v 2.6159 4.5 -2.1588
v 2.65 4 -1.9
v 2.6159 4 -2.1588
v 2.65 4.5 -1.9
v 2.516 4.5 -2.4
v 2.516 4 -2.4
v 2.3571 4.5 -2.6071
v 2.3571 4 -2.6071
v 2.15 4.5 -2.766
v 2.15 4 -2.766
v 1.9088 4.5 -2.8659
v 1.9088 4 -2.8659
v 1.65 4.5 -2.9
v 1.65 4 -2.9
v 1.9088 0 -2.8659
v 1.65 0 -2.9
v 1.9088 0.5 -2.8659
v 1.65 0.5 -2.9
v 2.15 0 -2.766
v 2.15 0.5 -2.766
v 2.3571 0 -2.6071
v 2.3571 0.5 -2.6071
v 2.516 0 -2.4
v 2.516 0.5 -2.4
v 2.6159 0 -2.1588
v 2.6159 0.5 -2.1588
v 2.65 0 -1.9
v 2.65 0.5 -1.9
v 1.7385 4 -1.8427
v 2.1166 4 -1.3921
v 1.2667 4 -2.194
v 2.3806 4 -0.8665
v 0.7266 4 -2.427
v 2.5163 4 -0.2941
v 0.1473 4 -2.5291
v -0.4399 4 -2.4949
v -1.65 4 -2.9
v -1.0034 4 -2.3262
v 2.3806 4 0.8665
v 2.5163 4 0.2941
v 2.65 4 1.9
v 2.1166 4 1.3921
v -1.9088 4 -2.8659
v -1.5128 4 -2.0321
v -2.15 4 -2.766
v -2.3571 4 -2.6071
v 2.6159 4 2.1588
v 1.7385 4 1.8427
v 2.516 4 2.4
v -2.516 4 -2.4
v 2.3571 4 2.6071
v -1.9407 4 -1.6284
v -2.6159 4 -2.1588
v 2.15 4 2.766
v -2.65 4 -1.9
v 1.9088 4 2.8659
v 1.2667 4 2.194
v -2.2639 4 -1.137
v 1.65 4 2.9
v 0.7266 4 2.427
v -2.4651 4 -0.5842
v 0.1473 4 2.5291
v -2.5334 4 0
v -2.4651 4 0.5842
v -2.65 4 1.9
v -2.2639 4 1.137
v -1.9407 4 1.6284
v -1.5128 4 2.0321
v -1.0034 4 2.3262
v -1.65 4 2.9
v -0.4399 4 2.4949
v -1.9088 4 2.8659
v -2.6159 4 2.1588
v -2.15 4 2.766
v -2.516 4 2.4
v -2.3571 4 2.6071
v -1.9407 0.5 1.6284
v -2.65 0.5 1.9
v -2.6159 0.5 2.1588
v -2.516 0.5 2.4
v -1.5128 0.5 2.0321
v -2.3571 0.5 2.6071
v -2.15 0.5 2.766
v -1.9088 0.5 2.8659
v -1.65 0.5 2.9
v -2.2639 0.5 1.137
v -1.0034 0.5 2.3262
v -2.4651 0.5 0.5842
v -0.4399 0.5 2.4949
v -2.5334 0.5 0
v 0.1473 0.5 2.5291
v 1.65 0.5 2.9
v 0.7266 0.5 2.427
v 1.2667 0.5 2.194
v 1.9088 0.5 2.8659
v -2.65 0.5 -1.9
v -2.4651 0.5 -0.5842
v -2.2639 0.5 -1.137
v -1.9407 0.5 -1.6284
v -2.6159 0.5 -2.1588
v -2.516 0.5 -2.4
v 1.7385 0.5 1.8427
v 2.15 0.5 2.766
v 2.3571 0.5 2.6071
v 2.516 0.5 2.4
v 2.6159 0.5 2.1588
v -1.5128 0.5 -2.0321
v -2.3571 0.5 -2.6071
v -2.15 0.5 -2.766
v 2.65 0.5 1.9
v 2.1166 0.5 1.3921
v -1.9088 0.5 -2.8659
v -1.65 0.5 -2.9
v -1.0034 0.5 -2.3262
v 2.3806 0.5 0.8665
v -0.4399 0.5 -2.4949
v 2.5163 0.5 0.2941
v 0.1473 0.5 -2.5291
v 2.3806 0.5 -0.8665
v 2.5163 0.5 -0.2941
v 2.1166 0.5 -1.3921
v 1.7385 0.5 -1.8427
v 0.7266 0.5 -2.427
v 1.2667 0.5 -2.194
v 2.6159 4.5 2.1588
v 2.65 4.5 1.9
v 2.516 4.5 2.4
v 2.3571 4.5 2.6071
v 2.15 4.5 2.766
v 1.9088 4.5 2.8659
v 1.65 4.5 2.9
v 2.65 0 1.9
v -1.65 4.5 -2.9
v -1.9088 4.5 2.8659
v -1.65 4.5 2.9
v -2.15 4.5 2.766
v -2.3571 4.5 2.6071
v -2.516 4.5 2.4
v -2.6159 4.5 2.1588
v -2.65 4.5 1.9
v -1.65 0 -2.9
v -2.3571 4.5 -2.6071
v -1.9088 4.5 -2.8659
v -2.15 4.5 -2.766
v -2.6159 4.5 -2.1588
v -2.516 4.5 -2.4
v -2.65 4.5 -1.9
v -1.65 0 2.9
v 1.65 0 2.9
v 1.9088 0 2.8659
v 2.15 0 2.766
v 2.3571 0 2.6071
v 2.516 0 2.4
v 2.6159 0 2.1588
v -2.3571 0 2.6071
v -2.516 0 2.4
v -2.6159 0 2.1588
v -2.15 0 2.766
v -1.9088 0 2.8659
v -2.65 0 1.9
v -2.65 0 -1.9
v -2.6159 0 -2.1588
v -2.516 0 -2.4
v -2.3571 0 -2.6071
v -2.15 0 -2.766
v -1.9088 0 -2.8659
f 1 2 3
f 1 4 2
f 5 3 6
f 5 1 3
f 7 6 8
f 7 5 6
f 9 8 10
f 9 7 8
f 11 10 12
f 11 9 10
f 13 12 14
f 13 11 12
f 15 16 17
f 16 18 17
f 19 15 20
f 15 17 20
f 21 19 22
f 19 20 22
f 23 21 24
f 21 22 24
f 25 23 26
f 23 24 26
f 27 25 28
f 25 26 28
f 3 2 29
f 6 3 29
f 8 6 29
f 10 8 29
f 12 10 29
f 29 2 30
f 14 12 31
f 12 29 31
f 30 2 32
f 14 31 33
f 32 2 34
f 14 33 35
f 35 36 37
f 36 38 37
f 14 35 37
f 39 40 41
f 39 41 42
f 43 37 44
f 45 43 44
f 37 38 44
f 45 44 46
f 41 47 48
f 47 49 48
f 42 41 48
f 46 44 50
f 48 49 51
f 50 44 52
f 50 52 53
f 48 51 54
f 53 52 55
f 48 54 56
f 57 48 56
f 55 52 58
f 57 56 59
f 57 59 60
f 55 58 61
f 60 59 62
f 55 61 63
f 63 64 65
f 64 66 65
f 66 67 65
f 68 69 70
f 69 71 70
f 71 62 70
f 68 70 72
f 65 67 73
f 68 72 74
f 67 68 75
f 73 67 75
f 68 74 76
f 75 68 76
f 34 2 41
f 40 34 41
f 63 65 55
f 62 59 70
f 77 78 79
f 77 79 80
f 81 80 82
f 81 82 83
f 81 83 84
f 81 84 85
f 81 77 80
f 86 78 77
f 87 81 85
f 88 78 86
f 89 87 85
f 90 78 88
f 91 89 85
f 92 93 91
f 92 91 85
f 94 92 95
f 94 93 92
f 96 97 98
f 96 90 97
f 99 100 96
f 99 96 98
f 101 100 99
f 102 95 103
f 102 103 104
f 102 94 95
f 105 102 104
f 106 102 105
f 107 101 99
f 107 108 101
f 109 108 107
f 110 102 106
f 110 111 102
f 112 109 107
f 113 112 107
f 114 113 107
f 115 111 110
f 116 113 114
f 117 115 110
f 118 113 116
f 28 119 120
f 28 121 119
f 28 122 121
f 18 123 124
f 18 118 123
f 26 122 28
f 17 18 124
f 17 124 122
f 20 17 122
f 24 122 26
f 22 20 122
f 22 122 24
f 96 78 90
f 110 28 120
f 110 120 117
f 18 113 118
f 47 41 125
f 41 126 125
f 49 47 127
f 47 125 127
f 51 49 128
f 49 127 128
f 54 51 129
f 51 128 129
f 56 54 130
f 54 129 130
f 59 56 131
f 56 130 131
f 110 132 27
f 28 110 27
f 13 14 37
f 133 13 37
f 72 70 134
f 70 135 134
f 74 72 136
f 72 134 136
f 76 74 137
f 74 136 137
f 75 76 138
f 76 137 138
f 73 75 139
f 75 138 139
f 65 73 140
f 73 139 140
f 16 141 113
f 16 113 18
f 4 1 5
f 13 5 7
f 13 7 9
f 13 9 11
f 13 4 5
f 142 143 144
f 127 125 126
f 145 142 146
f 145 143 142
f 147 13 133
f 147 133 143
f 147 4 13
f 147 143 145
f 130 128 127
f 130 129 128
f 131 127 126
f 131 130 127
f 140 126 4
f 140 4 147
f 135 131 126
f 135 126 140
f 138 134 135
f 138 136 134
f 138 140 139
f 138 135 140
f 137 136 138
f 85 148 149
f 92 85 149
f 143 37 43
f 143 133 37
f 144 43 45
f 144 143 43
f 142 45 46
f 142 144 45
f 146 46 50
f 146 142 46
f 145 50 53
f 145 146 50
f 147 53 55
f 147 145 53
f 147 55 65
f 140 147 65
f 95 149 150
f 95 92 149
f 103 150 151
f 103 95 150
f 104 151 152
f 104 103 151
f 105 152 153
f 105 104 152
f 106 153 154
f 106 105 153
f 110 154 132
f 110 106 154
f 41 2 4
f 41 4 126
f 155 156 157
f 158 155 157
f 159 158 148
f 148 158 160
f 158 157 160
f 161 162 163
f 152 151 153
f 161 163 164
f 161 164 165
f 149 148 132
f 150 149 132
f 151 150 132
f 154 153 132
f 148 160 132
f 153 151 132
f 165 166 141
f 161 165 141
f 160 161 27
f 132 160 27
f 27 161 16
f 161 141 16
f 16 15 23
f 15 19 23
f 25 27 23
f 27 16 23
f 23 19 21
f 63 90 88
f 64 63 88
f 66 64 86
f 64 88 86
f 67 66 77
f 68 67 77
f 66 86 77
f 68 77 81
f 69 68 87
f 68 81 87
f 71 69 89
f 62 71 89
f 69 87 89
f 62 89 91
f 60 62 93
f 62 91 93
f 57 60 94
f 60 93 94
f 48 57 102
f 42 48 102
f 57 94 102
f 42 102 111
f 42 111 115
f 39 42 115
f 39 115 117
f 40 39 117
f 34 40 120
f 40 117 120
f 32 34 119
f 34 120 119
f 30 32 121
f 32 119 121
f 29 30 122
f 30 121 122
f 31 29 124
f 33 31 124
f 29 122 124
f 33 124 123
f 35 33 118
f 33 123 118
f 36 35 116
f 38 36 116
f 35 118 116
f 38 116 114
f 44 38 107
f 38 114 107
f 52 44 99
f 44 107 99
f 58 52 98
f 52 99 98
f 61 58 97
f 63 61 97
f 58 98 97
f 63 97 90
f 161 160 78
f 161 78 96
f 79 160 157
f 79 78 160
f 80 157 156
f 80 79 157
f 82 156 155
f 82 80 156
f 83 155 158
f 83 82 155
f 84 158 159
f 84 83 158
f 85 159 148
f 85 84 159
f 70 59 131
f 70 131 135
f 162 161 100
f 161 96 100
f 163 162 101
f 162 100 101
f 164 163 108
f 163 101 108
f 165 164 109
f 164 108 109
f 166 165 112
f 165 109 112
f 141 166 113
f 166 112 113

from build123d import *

# Parameters (mm, degrees)
SKETCH1_W           = 5.3
SKETCH1_H           = 5.8
BOSS_EXTRUDE1_DEPTH = 0.5
SKETCH2_R           = 2.533399168
BOSS_EXTRUDE2_DEPTH = 3.5
SKETCH3_W           = 5.3
SKETCH3_H           = 5.8
BOSS_EXTRUDE3_DEPTH = 0.5
FILLET1_R           = 1


with BuildPart() as part:
    # Sketch1 → Boss-Extrude1 (new body)
    with BuildSketch(Plane(origin=(0, 0, 0), x_dir=(1, 0, 0), z_dir=(0, 1, 0))):
        Rectangle(SKETCH1_W, SKETCH1_H)
    extrude(amount=BOSS_EXTRUDE1_DEPTH)

    # Sketch2 → Boss-Extrude2 (add)
    with BuildSketch(Plane(origin=(0, 0.5, 0), x_dir=(-1, 0, 0), z_dir=(0, 1, 0))):
        Circle(SKETCH2_R)
    extrude(amount=BOSS_EXTRUDE2_DEPTH)

    # Sketch3 → Boss-Extrude3 (add)
    with BuildSketch(Plane(origin=(0, 4, 0), x_dir=(-1, 0, 0), z_dir=(0, 1, 0))):
        Rectangle(SKETCH3_W, SKETCH3_H)
    extrude(amount=BOSS_EXTRUDE3_DEPTH)

    # Fillet1
    fillet1_edges = [part.edges().sort_by_distance(p)[0] for p in [
        (-2.65, 4.25, -2.9),
        (-2.65, 4.25, 2.9),
        (2.65, 4.25, 2.9),
        (2.65, 4.25, -2.9),
        (2.65, 0.25, 2.9),
        (-2.65, 0.25, 2.9),
        (-2.65, 0.25, -2.9),
        (2.65, 0.25, -2.9),
    ]]
    fillet(fillet1_edges, radius=FILLET1_R)


solid = part.part
